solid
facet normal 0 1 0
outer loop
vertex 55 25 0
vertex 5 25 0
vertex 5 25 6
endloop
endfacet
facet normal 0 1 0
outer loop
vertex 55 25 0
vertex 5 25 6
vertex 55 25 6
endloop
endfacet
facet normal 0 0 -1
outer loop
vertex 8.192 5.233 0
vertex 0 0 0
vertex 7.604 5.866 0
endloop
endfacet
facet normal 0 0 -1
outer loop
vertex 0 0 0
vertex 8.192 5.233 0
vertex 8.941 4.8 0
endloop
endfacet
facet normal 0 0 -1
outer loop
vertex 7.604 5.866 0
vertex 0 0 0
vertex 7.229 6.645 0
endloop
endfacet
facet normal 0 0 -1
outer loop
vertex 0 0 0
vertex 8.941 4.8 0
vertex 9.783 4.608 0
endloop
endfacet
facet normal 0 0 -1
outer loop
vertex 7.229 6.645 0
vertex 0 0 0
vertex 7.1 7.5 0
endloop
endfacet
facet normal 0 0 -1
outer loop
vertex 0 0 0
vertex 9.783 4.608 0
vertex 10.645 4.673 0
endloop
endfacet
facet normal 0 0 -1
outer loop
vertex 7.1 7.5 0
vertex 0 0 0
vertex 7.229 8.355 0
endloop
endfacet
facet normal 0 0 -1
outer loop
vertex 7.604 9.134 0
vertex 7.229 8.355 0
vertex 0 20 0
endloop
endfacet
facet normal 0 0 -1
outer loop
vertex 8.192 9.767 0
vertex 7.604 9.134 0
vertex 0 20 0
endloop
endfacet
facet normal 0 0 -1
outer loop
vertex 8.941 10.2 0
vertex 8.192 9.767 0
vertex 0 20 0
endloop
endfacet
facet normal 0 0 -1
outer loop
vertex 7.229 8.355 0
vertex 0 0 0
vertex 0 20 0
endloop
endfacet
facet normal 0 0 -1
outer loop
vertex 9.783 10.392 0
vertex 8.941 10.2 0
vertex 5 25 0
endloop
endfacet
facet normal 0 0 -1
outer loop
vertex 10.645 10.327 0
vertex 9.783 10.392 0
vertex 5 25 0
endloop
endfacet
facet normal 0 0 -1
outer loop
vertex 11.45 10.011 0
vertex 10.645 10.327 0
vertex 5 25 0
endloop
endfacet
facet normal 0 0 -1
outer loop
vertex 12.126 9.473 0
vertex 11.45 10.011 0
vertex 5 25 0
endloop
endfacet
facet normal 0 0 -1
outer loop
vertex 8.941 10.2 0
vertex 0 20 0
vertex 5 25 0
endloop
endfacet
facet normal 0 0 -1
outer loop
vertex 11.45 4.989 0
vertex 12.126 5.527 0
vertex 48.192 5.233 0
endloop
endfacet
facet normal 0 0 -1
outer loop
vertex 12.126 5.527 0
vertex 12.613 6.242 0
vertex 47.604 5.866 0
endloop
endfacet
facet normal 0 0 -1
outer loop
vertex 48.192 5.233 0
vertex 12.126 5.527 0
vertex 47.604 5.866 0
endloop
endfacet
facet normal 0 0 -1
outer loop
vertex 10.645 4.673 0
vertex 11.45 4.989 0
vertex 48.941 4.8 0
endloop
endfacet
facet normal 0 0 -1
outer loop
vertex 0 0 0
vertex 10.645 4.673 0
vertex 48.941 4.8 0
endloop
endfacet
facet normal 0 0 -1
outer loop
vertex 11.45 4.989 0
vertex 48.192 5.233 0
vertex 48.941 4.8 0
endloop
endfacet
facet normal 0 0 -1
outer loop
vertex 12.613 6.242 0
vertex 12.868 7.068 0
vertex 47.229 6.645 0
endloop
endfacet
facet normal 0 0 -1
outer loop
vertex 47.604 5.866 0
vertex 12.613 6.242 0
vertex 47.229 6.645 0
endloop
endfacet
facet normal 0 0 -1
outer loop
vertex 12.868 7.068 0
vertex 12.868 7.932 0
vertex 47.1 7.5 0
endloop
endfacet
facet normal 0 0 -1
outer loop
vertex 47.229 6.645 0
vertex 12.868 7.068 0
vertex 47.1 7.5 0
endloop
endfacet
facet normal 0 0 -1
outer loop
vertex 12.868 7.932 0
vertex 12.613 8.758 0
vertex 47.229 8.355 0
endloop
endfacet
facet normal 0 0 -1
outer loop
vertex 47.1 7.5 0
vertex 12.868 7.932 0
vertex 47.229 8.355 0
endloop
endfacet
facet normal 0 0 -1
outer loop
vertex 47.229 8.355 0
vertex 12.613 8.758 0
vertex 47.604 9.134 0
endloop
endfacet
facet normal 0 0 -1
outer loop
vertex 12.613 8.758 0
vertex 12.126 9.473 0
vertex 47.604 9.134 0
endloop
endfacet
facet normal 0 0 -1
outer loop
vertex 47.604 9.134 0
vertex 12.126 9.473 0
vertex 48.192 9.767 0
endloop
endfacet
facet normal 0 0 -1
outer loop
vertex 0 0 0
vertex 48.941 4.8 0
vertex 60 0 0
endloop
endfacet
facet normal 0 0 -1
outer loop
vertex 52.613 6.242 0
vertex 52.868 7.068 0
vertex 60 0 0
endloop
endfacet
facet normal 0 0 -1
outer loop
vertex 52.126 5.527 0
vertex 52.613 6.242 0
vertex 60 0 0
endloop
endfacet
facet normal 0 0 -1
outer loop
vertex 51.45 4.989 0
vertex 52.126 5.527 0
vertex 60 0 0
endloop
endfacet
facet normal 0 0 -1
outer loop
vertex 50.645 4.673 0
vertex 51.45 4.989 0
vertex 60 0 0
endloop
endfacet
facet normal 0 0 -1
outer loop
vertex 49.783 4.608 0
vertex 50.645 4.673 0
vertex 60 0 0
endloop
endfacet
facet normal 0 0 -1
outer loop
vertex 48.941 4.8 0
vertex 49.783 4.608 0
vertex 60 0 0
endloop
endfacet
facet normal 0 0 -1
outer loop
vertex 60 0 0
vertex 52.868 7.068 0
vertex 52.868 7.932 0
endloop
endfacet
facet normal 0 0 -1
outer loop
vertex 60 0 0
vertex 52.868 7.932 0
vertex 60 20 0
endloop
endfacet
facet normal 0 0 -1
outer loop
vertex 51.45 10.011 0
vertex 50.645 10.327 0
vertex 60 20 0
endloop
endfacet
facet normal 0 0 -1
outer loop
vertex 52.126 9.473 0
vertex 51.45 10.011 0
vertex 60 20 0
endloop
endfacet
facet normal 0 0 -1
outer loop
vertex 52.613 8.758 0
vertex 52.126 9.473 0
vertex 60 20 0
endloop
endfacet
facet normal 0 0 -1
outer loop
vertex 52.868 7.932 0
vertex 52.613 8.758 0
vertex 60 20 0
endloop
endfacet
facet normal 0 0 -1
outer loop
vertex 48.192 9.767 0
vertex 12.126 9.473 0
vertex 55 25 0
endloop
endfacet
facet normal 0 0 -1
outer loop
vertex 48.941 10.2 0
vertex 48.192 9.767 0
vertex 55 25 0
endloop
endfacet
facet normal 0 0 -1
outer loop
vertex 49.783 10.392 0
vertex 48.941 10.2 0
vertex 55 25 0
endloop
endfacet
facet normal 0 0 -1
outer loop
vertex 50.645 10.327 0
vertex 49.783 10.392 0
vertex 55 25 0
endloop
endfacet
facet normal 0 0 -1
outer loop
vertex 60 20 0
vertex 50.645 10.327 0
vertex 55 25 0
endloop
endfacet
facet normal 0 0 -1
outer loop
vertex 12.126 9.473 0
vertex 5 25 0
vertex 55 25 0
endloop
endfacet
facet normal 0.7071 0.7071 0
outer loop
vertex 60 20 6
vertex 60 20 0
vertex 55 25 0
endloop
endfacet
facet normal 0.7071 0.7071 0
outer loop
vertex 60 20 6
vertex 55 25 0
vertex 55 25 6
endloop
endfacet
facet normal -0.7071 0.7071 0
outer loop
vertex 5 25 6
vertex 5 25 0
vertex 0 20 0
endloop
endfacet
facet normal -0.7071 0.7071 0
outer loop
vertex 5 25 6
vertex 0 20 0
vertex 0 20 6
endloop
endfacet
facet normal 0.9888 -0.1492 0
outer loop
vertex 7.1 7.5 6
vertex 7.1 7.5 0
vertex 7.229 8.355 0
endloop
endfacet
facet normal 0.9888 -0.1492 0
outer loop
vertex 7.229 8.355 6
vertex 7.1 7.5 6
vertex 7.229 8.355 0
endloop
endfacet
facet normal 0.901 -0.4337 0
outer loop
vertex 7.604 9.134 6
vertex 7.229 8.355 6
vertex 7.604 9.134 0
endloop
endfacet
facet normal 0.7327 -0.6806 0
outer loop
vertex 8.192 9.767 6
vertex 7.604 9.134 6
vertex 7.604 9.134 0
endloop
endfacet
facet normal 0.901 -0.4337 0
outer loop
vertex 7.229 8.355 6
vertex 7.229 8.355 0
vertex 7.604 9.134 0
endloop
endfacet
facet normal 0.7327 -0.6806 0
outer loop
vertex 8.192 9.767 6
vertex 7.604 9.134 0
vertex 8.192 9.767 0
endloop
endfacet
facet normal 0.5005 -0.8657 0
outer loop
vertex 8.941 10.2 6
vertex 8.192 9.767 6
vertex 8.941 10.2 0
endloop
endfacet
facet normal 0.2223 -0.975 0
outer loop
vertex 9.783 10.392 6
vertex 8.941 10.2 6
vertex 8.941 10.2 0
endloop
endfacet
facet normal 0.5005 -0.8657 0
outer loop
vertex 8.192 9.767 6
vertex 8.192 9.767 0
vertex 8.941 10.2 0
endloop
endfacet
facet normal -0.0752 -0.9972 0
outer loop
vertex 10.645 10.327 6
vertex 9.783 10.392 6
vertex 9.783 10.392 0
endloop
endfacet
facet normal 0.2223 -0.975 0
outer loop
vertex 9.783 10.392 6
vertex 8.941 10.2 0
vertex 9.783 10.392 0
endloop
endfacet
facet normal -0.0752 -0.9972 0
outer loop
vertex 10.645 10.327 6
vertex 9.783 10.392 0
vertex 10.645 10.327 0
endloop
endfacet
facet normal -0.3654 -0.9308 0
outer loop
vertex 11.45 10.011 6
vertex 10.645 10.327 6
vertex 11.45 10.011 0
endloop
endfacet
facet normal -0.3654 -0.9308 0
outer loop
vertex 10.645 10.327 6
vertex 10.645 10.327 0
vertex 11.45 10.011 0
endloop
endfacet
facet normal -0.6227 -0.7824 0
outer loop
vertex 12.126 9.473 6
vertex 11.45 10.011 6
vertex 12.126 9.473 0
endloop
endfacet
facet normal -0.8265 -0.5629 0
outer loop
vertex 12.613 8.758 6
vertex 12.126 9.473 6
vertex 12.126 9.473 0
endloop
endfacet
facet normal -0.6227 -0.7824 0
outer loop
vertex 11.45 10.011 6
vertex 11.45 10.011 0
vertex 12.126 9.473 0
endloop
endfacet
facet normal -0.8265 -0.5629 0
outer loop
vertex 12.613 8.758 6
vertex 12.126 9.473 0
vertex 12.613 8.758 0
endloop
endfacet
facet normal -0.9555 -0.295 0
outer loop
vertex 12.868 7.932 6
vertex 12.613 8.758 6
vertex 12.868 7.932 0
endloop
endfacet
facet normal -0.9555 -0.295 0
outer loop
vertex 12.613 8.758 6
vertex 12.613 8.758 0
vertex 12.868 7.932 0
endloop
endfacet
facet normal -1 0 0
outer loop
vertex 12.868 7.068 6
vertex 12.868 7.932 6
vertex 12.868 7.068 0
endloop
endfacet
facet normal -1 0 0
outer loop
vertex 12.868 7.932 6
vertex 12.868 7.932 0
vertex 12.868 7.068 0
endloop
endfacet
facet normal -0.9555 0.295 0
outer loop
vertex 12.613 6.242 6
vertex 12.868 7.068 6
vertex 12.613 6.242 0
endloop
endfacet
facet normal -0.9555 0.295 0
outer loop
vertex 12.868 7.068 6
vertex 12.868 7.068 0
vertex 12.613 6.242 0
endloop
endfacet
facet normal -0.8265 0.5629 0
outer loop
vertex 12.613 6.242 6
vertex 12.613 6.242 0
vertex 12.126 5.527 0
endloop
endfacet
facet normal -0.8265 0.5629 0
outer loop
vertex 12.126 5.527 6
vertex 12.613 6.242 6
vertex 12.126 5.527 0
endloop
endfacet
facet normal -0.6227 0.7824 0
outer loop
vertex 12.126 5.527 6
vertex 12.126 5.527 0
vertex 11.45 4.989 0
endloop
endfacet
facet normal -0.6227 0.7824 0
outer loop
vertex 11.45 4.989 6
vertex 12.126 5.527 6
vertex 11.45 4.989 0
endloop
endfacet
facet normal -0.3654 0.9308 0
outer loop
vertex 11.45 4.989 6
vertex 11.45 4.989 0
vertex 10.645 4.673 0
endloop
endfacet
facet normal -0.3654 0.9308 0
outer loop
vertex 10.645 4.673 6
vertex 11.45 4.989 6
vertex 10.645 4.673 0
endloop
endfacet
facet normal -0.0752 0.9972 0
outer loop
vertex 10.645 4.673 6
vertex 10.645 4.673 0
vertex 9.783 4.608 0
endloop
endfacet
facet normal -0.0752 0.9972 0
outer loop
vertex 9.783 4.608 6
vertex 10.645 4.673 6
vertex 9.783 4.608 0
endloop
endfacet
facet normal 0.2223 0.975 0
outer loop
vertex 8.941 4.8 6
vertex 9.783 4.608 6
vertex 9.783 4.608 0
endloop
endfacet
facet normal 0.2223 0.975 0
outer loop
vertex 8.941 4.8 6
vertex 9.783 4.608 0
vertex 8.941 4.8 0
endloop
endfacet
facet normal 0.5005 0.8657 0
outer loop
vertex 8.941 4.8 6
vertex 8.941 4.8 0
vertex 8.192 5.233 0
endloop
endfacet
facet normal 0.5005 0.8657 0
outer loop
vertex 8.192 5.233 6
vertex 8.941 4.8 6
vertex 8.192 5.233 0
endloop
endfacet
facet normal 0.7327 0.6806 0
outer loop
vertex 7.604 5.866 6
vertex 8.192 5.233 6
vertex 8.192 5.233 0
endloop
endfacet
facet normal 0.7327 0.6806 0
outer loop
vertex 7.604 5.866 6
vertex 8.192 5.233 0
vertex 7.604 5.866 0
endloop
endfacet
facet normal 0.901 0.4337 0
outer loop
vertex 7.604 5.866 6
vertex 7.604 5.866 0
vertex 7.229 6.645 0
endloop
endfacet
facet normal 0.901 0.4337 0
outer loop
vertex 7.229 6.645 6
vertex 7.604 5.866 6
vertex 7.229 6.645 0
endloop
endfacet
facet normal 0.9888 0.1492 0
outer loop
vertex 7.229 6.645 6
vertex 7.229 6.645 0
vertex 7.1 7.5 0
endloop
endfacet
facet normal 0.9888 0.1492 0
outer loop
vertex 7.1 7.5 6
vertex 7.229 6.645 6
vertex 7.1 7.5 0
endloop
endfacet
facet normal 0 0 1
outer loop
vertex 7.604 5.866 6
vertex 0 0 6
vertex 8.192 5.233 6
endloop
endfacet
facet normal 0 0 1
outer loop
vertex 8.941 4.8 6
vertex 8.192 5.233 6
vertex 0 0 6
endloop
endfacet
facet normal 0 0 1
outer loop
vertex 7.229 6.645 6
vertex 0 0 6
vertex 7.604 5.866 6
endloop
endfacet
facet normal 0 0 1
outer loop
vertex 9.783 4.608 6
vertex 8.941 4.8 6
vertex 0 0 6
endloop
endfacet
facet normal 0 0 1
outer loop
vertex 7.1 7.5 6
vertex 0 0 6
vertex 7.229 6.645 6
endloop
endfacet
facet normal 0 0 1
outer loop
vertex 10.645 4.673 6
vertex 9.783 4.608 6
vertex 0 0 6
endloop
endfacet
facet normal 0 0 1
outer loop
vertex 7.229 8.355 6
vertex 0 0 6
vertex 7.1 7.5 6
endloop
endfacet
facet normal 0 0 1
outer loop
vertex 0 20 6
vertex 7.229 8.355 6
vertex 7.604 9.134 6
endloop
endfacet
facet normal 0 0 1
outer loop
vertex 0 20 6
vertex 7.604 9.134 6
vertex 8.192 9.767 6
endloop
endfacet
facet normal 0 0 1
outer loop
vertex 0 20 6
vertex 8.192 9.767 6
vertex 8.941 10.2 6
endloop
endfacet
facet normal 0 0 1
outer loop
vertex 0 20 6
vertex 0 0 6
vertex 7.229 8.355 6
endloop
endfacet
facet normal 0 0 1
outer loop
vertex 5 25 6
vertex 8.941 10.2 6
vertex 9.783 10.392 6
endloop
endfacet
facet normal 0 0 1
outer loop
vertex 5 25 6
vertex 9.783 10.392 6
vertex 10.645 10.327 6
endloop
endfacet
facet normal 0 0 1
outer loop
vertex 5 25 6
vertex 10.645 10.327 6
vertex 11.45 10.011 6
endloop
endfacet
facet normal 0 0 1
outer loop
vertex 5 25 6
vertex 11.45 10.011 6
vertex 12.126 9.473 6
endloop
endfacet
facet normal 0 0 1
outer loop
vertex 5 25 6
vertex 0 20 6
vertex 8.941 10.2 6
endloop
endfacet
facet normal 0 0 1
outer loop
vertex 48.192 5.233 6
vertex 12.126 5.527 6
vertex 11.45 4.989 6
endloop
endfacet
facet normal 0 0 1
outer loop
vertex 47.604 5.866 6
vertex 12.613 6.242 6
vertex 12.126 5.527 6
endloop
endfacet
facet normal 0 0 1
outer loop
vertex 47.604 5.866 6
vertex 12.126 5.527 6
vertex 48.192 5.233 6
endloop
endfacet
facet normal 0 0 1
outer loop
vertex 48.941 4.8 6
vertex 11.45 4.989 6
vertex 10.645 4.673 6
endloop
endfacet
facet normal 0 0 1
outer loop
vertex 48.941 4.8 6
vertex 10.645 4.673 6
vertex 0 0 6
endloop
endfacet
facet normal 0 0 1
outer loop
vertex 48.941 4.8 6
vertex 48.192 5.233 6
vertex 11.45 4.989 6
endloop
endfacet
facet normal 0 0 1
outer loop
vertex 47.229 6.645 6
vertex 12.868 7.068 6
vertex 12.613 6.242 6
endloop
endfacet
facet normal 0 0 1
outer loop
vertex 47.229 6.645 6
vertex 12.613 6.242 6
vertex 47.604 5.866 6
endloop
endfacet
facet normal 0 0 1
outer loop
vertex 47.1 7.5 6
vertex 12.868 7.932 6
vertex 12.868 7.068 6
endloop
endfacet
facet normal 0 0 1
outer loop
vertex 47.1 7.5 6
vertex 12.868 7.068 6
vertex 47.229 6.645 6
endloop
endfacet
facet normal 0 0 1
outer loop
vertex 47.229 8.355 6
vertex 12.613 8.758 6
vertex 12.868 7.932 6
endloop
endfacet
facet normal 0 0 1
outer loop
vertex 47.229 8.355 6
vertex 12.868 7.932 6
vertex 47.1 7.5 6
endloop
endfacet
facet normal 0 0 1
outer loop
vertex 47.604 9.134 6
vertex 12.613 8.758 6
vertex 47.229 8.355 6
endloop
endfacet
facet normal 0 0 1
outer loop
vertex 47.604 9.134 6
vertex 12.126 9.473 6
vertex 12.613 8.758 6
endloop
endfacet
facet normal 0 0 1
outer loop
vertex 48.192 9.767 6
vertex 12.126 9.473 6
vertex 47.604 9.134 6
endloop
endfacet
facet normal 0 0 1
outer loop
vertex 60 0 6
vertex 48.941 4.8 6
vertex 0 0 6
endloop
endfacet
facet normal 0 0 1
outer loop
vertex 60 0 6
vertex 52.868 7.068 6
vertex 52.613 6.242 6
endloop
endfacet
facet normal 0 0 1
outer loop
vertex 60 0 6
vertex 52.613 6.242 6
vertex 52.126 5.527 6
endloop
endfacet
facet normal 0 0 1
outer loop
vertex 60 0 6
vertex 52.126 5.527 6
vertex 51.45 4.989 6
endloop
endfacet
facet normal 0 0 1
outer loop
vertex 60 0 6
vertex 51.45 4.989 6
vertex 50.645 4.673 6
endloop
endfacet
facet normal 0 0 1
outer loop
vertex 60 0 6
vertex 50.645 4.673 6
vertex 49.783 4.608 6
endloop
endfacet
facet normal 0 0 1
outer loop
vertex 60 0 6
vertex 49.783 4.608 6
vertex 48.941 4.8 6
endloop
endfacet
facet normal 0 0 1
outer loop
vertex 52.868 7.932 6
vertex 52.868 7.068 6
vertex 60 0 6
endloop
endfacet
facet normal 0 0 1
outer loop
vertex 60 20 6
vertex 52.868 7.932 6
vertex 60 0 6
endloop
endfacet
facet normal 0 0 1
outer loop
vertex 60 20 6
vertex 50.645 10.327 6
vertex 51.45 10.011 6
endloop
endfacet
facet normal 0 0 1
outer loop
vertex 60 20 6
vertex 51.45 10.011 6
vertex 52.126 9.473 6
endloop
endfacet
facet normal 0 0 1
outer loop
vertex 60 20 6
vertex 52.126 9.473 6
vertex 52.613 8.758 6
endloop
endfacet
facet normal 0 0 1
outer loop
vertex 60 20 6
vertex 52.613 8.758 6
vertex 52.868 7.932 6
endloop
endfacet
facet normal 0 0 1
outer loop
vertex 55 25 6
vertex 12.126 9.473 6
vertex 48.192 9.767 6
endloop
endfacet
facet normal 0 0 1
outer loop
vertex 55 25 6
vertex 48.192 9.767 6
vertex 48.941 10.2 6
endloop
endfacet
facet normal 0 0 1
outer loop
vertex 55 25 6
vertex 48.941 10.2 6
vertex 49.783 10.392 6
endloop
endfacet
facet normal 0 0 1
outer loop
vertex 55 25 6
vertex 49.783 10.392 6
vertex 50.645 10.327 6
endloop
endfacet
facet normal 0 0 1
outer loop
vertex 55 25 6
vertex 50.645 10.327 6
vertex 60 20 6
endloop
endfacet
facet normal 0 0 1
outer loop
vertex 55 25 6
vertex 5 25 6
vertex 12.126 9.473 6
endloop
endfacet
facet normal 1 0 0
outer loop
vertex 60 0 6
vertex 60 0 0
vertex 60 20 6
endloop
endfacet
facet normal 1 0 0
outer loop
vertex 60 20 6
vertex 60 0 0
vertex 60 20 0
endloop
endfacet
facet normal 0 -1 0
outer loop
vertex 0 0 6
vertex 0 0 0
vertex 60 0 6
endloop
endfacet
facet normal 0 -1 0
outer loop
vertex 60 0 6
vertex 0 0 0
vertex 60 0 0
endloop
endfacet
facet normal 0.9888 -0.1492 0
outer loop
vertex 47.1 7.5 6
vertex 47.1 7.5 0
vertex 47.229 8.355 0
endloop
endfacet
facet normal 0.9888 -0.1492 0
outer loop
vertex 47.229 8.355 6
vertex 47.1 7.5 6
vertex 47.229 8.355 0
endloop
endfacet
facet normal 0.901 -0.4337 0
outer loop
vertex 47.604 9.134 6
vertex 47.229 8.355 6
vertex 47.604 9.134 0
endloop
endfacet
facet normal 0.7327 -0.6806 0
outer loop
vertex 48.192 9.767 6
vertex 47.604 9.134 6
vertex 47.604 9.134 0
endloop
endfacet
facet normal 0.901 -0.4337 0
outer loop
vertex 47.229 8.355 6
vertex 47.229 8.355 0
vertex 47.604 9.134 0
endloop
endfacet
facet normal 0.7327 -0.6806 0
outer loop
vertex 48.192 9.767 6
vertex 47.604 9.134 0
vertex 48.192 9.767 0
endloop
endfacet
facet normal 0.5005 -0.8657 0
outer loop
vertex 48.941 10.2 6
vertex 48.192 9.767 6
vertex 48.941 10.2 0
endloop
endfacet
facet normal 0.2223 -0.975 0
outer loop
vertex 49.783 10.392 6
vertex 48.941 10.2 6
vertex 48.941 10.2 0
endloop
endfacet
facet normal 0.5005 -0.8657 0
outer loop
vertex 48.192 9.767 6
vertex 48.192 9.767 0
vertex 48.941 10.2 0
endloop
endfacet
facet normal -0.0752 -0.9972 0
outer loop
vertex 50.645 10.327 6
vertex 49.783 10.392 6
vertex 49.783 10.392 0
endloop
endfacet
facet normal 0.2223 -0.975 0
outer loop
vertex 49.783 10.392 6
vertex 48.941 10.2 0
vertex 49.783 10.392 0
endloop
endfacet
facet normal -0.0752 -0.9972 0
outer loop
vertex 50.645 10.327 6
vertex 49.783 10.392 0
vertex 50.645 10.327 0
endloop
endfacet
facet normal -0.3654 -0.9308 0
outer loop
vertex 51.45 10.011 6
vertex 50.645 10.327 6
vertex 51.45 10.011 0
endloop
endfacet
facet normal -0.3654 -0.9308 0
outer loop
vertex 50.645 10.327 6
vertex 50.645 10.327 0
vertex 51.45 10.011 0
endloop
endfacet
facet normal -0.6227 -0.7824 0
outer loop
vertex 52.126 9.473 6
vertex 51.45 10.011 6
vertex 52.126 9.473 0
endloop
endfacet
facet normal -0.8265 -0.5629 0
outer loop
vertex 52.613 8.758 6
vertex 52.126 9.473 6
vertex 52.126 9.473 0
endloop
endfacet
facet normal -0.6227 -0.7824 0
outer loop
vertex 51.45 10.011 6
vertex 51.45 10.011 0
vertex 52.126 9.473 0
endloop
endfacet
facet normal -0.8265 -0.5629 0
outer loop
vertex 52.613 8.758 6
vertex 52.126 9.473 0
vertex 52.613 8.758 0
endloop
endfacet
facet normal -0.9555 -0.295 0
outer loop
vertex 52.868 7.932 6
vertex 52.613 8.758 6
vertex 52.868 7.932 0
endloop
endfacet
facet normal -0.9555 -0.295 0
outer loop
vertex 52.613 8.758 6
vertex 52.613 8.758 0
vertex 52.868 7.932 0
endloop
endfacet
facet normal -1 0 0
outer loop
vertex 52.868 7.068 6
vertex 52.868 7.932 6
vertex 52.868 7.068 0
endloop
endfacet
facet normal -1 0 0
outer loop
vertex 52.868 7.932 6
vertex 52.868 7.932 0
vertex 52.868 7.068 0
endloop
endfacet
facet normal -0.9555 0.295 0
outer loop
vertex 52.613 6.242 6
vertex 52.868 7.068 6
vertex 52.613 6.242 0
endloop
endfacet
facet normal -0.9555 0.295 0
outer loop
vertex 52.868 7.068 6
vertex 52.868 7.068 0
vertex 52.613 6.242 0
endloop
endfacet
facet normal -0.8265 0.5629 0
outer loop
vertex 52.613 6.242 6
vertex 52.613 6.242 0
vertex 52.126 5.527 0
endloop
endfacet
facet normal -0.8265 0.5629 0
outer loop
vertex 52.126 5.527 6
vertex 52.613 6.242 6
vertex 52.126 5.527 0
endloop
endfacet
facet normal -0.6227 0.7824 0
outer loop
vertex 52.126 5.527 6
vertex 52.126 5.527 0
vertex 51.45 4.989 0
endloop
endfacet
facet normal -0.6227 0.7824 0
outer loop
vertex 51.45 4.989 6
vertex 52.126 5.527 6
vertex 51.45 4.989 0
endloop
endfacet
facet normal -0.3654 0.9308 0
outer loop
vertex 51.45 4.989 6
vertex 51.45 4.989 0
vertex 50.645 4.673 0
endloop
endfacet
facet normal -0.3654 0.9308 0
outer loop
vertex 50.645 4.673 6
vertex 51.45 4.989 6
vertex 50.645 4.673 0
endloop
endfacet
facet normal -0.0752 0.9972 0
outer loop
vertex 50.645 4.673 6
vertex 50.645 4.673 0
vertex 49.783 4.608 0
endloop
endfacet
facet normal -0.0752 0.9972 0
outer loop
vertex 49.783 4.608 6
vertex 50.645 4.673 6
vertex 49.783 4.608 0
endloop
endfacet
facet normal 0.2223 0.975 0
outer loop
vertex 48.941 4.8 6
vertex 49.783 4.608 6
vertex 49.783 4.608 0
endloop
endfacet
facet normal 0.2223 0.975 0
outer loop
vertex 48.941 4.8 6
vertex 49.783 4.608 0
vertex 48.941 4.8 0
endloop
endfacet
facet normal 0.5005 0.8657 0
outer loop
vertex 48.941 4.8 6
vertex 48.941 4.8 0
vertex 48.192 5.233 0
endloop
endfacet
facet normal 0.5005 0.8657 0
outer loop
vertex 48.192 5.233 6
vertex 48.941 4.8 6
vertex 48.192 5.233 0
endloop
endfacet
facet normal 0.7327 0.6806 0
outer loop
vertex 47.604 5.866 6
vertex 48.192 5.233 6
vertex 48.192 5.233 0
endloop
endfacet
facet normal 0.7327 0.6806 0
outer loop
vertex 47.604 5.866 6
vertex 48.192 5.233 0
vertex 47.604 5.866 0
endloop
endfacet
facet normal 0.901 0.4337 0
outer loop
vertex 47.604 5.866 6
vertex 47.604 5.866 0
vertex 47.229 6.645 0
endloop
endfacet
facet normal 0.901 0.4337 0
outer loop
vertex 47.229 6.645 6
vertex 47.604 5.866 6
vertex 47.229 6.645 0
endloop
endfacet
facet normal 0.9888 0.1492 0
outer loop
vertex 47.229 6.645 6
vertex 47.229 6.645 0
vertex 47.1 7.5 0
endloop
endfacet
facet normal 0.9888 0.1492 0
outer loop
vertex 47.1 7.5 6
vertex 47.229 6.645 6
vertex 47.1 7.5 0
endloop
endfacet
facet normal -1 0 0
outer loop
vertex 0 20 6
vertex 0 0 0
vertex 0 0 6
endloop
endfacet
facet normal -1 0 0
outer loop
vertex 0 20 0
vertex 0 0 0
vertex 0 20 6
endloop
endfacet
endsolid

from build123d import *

# Parameters (mm, degrees)
F0_W     = 60
F0_H     = 25
F1_DEPTH = 6
F3_D     = 5.8
F4_SIZE  = 5


with BuildPart() as f1:
    # F0 (on Top) → F1 (new body)
    with BuildSketch(Plane.XY):
        with Locations((30, 12.5)):
            Rectangle(F0_W, F0_H)
    extrude(amount=F1_DEPTH)

    # F3 (through all)
    with Locations(Plane.XY.offset(6)):
        with Locations((50, 7.5), (10, 7.5)):
            Hole(F3_D / 2)

    # F4
    f4_edges = [f1.edges().sort_by_distance(p)[0] for p in [
        (60, 25, 3),
        (0, 25, 3),
    ]]
    chamfer(f4_edges, length=F4_SIZE)


solid = f1.part
